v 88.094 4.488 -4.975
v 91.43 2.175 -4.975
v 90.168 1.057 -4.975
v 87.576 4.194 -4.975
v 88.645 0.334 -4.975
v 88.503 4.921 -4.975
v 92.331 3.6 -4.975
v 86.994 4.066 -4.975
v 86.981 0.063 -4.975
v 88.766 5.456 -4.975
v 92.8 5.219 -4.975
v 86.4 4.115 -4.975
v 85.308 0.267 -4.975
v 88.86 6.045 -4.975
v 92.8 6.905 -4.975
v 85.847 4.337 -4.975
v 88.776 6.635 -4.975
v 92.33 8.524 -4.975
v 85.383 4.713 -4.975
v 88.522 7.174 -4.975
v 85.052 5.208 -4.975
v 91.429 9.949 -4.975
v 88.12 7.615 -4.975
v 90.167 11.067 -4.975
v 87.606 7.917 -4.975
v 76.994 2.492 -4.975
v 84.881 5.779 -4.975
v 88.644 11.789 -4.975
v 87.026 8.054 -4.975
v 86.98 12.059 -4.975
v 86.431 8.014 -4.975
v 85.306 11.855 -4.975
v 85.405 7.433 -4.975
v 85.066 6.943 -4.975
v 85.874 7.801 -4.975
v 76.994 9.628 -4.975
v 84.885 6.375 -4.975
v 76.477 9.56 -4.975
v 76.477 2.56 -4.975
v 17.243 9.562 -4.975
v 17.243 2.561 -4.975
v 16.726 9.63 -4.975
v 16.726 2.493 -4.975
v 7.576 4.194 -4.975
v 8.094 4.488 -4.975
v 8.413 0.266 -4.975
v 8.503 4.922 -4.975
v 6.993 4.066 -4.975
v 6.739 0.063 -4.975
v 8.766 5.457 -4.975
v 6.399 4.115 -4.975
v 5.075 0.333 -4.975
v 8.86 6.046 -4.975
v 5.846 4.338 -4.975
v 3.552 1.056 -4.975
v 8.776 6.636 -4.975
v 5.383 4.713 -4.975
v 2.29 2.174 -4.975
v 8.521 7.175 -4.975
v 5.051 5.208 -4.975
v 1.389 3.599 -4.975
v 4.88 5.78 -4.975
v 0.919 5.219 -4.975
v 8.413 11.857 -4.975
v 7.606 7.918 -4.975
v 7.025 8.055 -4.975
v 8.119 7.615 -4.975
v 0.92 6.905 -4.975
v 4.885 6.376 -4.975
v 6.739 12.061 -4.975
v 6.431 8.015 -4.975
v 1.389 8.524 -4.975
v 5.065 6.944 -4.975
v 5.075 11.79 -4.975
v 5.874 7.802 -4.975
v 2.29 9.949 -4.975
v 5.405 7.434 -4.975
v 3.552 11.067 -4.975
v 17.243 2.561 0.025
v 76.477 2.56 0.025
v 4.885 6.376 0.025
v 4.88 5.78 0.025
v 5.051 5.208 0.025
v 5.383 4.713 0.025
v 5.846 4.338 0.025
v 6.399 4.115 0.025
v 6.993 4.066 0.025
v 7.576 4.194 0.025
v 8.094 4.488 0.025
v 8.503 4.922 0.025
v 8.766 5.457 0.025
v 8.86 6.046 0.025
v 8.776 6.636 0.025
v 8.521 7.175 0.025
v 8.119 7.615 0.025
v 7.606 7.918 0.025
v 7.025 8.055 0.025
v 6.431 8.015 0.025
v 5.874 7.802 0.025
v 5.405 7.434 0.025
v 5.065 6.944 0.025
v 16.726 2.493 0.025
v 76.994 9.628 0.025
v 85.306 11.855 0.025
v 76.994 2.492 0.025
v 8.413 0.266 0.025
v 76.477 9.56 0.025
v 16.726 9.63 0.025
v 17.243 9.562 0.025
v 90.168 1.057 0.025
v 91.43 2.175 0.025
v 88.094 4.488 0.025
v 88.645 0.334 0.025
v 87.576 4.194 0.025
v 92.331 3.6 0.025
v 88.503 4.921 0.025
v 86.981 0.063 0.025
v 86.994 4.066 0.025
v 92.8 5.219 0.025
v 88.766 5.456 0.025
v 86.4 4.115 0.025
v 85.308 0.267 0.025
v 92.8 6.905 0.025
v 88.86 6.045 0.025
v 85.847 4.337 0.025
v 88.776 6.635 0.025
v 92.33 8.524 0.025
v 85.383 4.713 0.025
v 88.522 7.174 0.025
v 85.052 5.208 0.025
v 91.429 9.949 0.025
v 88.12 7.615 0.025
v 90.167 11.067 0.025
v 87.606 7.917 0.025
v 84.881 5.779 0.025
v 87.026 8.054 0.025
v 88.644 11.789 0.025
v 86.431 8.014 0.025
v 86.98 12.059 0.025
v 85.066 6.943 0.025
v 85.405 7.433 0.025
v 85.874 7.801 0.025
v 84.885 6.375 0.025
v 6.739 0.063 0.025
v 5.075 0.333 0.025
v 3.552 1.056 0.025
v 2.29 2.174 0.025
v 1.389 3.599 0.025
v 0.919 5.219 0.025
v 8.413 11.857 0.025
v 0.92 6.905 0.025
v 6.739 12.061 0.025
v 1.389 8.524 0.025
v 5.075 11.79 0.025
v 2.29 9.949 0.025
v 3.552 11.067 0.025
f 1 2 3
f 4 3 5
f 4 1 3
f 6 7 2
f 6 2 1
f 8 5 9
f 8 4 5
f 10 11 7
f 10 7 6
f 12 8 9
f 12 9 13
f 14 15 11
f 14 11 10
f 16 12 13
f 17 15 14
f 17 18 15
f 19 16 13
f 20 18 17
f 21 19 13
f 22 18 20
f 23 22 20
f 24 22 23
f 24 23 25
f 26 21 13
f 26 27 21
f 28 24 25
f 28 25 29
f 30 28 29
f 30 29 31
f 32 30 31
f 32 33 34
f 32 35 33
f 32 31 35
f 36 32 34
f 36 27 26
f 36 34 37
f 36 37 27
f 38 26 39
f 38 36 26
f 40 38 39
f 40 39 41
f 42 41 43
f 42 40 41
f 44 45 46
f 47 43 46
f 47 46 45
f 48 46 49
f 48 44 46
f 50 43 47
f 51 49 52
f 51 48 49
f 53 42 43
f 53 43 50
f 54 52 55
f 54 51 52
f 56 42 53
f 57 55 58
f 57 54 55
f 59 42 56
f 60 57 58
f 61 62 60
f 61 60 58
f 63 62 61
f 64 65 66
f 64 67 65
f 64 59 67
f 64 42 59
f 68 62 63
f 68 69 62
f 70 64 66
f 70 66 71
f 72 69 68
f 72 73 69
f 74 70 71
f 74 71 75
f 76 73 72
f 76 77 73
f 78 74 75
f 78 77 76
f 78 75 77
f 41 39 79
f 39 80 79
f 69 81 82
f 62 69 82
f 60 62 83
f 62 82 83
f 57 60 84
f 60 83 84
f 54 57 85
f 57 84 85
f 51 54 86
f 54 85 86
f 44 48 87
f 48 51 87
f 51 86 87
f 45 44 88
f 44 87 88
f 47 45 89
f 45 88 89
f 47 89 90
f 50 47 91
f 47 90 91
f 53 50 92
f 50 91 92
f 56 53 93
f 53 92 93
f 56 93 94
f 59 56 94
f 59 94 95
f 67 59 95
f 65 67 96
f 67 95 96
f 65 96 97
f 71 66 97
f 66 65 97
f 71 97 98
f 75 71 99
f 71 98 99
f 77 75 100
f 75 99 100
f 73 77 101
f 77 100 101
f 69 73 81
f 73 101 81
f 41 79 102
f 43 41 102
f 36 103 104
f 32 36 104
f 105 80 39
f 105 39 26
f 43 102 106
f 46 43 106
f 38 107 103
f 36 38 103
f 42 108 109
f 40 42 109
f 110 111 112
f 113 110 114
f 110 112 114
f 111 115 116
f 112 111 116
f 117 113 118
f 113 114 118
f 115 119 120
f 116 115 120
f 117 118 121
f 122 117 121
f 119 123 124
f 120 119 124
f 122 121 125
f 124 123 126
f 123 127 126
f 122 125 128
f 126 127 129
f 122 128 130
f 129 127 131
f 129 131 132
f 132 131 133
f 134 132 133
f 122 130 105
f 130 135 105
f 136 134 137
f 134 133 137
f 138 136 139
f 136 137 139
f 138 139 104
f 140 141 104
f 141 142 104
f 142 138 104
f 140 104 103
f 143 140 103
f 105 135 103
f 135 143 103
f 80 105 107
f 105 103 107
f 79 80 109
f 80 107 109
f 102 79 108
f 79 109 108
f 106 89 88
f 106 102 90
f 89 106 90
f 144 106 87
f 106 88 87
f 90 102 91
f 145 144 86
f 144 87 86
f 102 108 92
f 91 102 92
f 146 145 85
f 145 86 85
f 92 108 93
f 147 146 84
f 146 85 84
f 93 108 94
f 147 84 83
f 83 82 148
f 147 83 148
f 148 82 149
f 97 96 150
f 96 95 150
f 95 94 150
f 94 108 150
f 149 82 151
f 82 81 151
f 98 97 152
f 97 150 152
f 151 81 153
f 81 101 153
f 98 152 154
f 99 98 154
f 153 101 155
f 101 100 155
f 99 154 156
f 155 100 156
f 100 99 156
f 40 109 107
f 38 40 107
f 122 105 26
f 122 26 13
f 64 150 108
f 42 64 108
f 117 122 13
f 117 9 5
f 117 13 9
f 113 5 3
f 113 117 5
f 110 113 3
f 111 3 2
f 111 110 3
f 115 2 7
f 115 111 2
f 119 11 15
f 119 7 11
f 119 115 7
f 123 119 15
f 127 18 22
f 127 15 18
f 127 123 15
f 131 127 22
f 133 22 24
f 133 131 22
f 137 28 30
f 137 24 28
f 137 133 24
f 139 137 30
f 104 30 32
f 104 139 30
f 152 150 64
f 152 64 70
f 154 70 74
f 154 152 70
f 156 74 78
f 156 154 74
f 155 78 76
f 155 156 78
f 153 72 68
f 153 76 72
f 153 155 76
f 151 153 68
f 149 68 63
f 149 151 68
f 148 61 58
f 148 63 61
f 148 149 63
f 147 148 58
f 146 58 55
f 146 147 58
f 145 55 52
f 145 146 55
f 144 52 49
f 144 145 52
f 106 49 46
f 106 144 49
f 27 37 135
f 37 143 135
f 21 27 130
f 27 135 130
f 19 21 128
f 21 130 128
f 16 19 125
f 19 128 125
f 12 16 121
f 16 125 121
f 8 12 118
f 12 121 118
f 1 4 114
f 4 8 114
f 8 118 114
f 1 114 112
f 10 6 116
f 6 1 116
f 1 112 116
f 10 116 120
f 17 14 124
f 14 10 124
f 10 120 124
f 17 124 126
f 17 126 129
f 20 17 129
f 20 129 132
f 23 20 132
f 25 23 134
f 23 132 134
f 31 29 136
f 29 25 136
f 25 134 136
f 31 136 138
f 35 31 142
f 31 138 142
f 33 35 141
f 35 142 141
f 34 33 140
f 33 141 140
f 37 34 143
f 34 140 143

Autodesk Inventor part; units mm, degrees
ref_plane "YZ Plane" through (0, 0, 0) normal (1, 0, 0) x (0, 1, 0)
ref_plane "XZ Plane" through (0, 0, 0) normal (0, 1, 0) x (-1, 0, 0)
ref_plane "Plano de trabajo1" through (86.86, 8.06, 0.025) normal (0, 0, -1) x (-0.9876, 0.157, 0)
sketch "Boceto1" plane through (86.86, 8.06, 0.025) normal (0, 0, -1) x (-0.9876, 0.157, 0)
  line L0 (0.3099, -7.9427) -> (0.3097, -7.9404)
  circle A0 centre (-0.3141, -1.974) radius 1.9997
  arc A1 (2.1306, 3.5042) -> (0.3097, -7.9404) centre (-0.3141, -1.974) ccw
  arc A2 (76.2508, -20.0134) -> (78.0703, -8.566) centre (78.6942, -14.5335) ccw
  circle A3 centre (78.6942, -14.5335) radius 2
  line L1 (10.4901, -0.1486) -> (9.9896, 0)
  line L2 (69.5109, -9.4609) -> (68.989, -9.4469)
  line L3 (67.8902, -16.3602) -> (68.3907, -16.5087)
  line L4 (9.3912, -7.0618) -> (8.8693, -7.0478)
  line L5 (9.9896, 0) -> (2.1306, 3.5042)
  line L6 (8.8693, -7.0478) -> (0.3097, -7.9404)
  line L7 (9.3912, -7.0618) -> (67.8902, -16.3602)
  line L8 (68.3907, -16.5087) -> (76.2508, -20.0134)
  line L9 (78.0703, -8.566) -> (69.5109, -9.4609)
  line L10 (68.989, -9.4469) -> (10.4901, -0.1486)
  point P0 (84.5179, -21.5953)
  point P1 (2.1295, 3.5047)
  point P2 (78.0703, -8.566)
  point P3 (1.5536, -1.2595)
  point P4 (76.719, -14.2196)
extrude "Extrusión1" add sketch "Boceto1" along normal blind 5
sketch "Boceto2" plane through (86.86, 8.06, 0.025) normal (0, 0, 1) x (0.9876, -0.157, 0)
  point P0 (-84.5179, -21.5953)
properties part number "STEP translator 7.5 1"
